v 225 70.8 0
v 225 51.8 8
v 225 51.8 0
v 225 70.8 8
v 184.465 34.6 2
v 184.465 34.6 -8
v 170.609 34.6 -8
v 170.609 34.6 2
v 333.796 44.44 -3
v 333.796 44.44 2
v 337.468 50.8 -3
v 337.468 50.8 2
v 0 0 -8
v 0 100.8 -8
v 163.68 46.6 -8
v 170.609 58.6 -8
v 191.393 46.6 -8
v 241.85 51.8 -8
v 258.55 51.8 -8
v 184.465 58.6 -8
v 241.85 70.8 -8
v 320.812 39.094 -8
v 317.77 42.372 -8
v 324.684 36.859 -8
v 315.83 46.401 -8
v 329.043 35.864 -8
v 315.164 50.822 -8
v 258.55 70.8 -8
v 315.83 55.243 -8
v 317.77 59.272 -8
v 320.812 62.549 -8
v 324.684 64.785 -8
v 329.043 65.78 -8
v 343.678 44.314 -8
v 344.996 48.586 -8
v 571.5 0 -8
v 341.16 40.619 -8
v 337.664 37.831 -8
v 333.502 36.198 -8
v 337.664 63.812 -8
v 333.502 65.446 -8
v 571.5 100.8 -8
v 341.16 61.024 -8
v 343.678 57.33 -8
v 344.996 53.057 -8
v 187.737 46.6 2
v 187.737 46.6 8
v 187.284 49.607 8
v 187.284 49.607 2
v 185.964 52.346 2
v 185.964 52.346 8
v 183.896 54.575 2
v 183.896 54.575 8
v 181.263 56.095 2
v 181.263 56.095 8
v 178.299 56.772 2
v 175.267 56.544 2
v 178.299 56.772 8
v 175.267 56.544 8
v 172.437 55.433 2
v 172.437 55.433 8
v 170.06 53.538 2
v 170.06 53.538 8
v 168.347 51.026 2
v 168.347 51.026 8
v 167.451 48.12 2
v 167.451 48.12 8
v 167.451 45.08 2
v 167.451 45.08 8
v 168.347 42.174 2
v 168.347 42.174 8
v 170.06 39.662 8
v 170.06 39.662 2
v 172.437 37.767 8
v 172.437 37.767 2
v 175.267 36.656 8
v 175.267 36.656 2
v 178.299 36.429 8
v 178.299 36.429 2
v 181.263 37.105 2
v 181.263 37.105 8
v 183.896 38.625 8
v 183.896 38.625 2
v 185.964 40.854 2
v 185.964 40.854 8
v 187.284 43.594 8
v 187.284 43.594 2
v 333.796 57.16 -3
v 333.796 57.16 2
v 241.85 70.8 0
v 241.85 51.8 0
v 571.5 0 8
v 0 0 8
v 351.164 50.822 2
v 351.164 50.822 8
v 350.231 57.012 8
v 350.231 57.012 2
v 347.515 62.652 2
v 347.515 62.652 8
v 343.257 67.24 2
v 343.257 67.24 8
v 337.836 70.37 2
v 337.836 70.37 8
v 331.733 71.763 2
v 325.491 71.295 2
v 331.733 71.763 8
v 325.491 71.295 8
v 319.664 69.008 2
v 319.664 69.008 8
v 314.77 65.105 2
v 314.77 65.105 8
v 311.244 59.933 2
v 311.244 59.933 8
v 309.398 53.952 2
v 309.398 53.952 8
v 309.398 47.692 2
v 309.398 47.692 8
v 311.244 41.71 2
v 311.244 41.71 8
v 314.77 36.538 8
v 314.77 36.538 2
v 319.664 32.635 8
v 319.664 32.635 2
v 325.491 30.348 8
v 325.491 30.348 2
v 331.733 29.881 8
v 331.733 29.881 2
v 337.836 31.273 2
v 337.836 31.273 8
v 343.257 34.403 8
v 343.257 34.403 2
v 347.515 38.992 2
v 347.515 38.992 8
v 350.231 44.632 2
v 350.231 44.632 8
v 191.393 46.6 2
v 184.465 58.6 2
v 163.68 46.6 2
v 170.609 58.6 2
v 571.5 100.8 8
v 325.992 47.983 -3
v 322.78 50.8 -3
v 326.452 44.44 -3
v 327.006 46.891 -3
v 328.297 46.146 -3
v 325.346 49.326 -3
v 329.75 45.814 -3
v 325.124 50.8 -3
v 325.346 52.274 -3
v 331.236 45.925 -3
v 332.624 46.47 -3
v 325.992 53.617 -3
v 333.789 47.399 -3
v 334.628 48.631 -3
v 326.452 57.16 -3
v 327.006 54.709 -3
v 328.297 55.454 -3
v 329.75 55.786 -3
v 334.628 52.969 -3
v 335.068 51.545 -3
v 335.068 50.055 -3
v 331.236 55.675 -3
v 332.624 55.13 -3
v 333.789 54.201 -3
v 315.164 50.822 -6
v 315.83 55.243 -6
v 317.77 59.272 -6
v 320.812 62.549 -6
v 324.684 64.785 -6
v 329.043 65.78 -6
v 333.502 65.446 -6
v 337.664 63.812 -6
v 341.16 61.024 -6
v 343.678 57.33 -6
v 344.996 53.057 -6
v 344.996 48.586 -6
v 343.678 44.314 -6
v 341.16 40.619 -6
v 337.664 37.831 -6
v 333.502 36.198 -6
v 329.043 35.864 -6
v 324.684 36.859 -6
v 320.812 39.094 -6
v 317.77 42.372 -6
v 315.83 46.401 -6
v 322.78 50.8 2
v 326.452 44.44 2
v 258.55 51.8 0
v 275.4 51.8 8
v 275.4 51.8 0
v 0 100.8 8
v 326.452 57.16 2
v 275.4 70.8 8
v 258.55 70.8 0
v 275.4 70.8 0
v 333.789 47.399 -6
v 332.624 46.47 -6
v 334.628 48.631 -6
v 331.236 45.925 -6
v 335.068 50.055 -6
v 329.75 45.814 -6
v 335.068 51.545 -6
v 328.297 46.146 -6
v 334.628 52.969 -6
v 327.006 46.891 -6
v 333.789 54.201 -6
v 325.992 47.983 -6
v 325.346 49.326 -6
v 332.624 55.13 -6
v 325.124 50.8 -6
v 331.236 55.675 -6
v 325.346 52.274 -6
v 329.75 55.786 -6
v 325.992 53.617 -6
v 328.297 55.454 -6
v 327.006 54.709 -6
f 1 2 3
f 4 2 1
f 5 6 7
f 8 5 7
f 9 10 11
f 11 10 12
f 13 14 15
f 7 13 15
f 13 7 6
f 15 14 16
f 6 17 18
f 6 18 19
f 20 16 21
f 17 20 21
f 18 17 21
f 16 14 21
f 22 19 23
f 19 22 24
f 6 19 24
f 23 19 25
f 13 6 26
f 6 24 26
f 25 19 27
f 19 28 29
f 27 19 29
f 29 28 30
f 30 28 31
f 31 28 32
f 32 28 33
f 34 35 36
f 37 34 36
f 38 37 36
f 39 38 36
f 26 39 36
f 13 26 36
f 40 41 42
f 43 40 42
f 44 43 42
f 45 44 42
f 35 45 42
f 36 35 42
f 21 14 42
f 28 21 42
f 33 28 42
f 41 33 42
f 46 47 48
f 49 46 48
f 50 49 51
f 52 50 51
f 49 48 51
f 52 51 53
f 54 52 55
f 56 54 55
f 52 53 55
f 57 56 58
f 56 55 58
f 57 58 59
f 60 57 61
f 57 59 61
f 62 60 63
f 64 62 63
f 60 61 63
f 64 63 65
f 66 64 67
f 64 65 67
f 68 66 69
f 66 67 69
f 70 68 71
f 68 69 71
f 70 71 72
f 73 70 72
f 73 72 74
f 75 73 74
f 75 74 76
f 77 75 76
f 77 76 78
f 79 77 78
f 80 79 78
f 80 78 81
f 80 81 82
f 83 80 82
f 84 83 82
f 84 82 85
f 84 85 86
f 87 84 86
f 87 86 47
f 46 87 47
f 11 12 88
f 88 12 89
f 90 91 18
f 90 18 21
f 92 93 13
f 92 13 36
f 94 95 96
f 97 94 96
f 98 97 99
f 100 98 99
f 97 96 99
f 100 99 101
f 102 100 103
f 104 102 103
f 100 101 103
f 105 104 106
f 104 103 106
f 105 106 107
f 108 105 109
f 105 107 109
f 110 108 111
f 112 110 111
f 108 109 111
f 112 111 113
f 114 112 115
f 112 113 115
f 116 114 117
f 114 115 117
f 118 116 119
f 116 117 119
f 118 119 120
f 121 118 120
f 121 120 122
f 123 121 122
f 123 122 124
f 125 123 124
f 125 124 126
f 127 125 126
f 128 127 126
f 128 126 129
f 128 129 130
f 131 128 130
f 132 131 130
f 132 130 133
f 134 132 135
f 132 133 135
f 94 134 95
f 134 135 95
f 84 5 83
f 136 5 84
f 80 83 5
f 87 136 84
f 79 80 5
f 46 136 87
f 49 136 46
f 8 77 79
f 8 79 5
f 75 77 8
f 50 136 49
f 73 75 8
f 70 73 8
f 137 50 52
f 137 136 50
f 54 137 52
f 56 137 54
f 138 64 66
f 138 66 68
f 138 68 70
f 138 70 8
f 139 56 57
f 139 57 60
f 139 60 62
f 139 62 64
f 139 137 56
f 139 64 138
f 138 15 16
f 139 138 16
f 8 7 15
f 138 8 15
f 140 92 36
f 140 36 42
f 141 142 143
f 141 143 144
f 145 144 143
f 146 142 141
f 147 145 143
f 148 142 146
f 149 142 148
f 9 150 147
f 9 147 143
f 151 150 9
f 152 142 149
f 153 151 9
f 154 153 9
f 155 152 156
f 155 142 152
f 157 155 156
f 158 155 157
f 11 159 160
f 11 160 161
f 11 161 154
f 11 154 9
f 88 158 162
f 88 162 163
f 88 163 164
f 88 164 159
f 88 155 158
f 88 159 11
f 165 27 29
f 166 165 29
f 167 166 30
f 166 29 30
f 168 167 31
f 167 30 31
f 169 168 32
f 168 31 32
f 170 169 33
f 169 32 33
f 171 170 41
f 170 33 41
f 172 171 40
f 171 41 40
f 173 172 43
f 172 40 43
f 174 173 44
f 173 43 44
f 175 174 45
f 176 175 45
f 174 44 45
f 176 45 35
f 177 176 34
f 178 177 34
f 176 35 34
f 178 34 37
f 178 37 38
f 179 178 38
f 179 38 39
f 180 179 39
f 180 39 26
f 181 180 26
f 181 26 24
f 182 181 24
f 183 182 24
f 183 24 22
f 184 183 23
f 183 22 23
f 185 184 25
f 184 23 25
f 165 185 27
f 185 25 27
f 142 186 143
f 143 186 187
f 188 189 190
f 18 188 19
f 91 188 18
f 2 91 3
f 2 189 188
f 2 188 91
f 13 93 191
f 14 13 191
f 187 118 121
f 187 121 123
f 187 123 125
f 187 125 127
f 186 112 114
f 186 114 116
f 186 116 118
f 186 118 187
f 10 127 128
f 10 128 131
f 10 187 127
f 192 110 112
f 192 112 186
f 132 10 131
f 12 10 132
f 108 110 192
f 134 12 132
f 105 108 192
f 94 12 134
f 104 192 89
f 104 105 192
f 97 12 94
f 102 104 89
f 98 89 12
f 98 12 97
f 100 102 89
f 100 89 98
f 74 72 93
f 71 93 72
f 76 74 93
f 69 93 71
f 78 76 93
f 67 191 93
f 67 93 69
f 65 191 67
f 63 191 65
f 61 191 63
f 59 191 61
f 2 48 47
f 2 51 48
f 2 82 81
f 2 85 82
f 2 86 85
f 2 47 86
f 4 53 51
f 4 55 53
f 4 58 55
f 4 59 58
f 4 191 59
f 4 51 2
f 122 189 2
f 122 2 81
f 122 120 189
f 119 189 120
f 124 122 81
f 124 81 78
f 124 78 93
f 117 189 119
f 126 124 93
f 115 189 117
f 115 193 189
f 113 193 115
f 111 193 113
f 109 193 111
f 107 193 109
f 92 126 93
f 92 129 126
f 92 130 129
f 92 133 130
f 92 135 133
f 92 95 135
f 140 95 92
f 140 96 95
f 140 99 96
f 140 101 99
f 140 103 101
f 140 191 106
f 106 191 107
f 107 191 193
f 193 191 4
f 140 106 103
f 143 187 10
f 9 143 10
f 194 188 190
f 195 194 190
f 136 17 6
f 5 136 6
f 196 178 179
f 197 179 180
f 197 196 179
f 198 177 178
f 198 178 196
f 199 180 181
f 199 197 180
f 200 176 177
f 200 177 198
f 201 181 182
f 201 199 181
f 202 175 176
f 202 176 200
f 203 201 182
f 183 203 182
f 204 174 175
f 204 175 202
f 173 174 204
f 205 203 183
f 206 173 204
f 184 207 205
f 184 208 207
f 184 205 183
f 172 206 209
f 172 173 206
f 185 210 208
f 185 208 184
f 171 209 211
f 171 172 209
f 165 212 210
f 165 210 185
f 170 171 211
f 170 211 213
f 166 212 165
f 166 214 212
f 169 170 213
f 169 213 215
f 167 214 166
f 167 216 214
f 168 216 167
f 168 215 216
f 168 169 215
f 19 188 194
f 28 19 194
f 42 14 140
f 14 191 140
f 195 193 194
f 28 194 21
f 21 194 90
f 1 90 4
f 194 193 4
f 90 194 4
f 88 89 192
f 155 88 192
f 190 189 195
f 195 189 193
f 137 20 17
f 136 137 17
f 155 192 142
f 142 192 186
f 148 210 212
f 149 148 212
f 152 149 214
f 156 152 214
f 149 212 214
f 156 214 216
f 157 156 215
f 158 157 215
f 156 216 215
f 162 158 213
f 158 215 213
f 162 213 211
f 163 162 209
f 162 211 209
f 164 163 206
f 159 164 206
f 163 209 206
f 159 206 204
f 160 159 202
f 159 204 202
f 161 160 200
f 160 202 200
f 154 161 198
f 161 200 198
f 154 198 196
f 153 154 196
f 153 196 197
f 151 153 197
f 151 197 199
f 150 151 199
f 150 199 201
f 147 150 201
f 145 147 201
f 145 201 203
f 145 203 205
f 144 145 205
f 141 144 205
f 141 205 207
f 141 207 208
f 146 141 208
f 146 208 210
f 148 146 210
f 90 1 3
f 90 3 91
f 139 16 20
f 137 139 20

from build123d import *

# Parameters (mm, degrees)
SKETCH1_W                  = 571.5
SKETCH1_H                  = 100.8
BOSS_EXTRUDE1_DEPTH        = 8
SKETCH4_R                  = 7.5
CUT_EXTRUDE3_DEPTH         = 2
SKETCH5_R                  = 5
CUT_EXTRUDE4_DEPTH         = 581.490215249
CUT_EXTRUDE5_DEPTH         = 11
SKETCH9_R                  = 10.2
POWER_AND_USB_CABLES_DEPTH = 581.541893406
SKETCH10_R                 = 21
CUT_EXTRUDE6_DEPTH         = 6
CUT_EXTRUDE8_DEPTH         = 10
CUT_EXTRUDE9_DEPTH         = 581.541893406
CUT_EXTRUDE9_DEPTH_BACK    = 581.541893406
SKETCH13_W                 = 16.7
SKETCH13_H                 = 19
SKETCH14_W                 = 50.4
SKETCH14_H                 = 19
CUT_EXTRUDE10_DEPTH        = 8
SKETCH15_R                 = 15
CUT_EXTRUDE11_DEPTH        = 2


with BuildPart() as part:
    # Sketch1 → Boss-Extrude1 (new, symmetric)
    with BuildSketch(Plane.XY):
        with Locations((285.75, 50.4)):
            Rectangle(SKETCH1_W, SKETCH1_H)
    extrude(amount=BOSS_EXTRUDE1_DEPTH, both=True)

    # Sketch4 → Cut-Extrude3 (cut)
    with BuildSketch(Plane(origin=(0, 0, -8), x_dir=(-1, 0, 0), z_dir=(0, 0, -1))):
        with Locations((-330.123617772, 50.8)):
            Circle(SKETCH4_R)
    extrude(amount=-CUT_EXTRUDE3_DEPTH, mode=Mode.SUBTRACT)

    # Sketch5 → Cut-Extrude4 (cut, through all)
    with BuildSketch(Plane(origin=(0, 0, -6), x_dir=(-1, 0, 0), z_dir=(0, 0, -1))):
        with Locations((-330.123617772, 50.8)):
            Circle(SKETCH5_R)
    extrude(amount=-CUT_EXTRUDE4_DEPTH, mode=Mode.SUBTRACT)

    # Sketch6 → Cut-Extrude5 (cut)
    with BuildSketch(Plane.XY.offset(8)):
        Polygon((337.467513196, 50.8), (333.795565484, 57.16), (326.45167006, 57.16), (322.779722348, 50.8), (326.45167006, 44.44), (333.795565484, 44.44), align=None)
    extrude(amount=-CUT_EXTRUDE5_DEPTH, mode=Mode.SUBTRACT)

    # Sketch9 → power and usb cables (cut, through all)
    with BuildSketch(Plane.XY.offset(8)):
        with Locations((177.536724471, 46.600039321)):
            Circle(SKETCH9_R)
    extrude(amount=-POWER_AND_USB_CABLES_DEPTH, mode=Mode.SUBTRACT)

    # Sketch10 → Cut-Extrude6 (cut)
    with BuildSketch(Plane.XY.offset(8)):
        with Locations((330.16394587, 50.821844921)):
            Circle(SKETCH10_R)
    extrude(amount=-CUT_EXTRUDE6_DEPTH, mode=Mode.SUBTRACT)

    # Sketch12 → Cut-Extrude8 (cut)
    with BuildSketch(Plane(origin=(0, 0, -8), x_dir=(-1, 0, 0), z_dir=(0, 0, -1))):
        Polygon((-163.68031801, 46.600039321), (-170.608521241, 58.600039321), (-184.464927701, 58.600039321), (-191.393130932, 46.600039321), (-184.464927701, 34.600039321), (-170.608521241, 34.600039321), align=None)
    extrude(amount=-CUT_EXTRUDE8_DEPTH, mode=Mode.SUBTRACT)

    # Sketch13 → Cut-Extrude9 (cut, two sides: drawn at the far end of the back side and taken through both)
    with BuildSketch(Plane(origin=(0, 0, -8), x_dir=(-1, 0, 0), z_dir=(0, 0, -1)).offset(-CUT_EXTRUDE9_DEPTH_BACK)):
        with Locations((-250.2, 61.3)):
            Rectangle(SKETCH13_W, SKETCH13_H)
    extrude(amount=CUT_EXTRUDE9_DEPTH + CUT_EXTRUDE9_DEPTH_BACK, mode=Mode.SUBTRACT)

    # Sketch14 → Cut-Extrude10 (cut)
    with BuildSketch(Plane.XY.offset(8)):
        with Locations((250.2, 61.3)):
            Rectangle(SKETCH14_W, SKETCH14_H)
    extrude(amount=-CUT_EXTRUDE10_DEPTH, mode=Mode.SUBTRACT)

    # Sketch15 → Cut-Extrude11 (cut)
    with BuildSketch(Plane(origin=(0, 0, -8), x_dir=(-1, 0, 0), z_dir=(0, 0, -1))):
        with Locations((-330.16394587, 50.821844921)):
            Circle(SKETCH15_R)
    extrude(amount=-CUT_EXTRUDE11_DEPTH, mode=Mode.SUBTRACT)


solid = part.part
